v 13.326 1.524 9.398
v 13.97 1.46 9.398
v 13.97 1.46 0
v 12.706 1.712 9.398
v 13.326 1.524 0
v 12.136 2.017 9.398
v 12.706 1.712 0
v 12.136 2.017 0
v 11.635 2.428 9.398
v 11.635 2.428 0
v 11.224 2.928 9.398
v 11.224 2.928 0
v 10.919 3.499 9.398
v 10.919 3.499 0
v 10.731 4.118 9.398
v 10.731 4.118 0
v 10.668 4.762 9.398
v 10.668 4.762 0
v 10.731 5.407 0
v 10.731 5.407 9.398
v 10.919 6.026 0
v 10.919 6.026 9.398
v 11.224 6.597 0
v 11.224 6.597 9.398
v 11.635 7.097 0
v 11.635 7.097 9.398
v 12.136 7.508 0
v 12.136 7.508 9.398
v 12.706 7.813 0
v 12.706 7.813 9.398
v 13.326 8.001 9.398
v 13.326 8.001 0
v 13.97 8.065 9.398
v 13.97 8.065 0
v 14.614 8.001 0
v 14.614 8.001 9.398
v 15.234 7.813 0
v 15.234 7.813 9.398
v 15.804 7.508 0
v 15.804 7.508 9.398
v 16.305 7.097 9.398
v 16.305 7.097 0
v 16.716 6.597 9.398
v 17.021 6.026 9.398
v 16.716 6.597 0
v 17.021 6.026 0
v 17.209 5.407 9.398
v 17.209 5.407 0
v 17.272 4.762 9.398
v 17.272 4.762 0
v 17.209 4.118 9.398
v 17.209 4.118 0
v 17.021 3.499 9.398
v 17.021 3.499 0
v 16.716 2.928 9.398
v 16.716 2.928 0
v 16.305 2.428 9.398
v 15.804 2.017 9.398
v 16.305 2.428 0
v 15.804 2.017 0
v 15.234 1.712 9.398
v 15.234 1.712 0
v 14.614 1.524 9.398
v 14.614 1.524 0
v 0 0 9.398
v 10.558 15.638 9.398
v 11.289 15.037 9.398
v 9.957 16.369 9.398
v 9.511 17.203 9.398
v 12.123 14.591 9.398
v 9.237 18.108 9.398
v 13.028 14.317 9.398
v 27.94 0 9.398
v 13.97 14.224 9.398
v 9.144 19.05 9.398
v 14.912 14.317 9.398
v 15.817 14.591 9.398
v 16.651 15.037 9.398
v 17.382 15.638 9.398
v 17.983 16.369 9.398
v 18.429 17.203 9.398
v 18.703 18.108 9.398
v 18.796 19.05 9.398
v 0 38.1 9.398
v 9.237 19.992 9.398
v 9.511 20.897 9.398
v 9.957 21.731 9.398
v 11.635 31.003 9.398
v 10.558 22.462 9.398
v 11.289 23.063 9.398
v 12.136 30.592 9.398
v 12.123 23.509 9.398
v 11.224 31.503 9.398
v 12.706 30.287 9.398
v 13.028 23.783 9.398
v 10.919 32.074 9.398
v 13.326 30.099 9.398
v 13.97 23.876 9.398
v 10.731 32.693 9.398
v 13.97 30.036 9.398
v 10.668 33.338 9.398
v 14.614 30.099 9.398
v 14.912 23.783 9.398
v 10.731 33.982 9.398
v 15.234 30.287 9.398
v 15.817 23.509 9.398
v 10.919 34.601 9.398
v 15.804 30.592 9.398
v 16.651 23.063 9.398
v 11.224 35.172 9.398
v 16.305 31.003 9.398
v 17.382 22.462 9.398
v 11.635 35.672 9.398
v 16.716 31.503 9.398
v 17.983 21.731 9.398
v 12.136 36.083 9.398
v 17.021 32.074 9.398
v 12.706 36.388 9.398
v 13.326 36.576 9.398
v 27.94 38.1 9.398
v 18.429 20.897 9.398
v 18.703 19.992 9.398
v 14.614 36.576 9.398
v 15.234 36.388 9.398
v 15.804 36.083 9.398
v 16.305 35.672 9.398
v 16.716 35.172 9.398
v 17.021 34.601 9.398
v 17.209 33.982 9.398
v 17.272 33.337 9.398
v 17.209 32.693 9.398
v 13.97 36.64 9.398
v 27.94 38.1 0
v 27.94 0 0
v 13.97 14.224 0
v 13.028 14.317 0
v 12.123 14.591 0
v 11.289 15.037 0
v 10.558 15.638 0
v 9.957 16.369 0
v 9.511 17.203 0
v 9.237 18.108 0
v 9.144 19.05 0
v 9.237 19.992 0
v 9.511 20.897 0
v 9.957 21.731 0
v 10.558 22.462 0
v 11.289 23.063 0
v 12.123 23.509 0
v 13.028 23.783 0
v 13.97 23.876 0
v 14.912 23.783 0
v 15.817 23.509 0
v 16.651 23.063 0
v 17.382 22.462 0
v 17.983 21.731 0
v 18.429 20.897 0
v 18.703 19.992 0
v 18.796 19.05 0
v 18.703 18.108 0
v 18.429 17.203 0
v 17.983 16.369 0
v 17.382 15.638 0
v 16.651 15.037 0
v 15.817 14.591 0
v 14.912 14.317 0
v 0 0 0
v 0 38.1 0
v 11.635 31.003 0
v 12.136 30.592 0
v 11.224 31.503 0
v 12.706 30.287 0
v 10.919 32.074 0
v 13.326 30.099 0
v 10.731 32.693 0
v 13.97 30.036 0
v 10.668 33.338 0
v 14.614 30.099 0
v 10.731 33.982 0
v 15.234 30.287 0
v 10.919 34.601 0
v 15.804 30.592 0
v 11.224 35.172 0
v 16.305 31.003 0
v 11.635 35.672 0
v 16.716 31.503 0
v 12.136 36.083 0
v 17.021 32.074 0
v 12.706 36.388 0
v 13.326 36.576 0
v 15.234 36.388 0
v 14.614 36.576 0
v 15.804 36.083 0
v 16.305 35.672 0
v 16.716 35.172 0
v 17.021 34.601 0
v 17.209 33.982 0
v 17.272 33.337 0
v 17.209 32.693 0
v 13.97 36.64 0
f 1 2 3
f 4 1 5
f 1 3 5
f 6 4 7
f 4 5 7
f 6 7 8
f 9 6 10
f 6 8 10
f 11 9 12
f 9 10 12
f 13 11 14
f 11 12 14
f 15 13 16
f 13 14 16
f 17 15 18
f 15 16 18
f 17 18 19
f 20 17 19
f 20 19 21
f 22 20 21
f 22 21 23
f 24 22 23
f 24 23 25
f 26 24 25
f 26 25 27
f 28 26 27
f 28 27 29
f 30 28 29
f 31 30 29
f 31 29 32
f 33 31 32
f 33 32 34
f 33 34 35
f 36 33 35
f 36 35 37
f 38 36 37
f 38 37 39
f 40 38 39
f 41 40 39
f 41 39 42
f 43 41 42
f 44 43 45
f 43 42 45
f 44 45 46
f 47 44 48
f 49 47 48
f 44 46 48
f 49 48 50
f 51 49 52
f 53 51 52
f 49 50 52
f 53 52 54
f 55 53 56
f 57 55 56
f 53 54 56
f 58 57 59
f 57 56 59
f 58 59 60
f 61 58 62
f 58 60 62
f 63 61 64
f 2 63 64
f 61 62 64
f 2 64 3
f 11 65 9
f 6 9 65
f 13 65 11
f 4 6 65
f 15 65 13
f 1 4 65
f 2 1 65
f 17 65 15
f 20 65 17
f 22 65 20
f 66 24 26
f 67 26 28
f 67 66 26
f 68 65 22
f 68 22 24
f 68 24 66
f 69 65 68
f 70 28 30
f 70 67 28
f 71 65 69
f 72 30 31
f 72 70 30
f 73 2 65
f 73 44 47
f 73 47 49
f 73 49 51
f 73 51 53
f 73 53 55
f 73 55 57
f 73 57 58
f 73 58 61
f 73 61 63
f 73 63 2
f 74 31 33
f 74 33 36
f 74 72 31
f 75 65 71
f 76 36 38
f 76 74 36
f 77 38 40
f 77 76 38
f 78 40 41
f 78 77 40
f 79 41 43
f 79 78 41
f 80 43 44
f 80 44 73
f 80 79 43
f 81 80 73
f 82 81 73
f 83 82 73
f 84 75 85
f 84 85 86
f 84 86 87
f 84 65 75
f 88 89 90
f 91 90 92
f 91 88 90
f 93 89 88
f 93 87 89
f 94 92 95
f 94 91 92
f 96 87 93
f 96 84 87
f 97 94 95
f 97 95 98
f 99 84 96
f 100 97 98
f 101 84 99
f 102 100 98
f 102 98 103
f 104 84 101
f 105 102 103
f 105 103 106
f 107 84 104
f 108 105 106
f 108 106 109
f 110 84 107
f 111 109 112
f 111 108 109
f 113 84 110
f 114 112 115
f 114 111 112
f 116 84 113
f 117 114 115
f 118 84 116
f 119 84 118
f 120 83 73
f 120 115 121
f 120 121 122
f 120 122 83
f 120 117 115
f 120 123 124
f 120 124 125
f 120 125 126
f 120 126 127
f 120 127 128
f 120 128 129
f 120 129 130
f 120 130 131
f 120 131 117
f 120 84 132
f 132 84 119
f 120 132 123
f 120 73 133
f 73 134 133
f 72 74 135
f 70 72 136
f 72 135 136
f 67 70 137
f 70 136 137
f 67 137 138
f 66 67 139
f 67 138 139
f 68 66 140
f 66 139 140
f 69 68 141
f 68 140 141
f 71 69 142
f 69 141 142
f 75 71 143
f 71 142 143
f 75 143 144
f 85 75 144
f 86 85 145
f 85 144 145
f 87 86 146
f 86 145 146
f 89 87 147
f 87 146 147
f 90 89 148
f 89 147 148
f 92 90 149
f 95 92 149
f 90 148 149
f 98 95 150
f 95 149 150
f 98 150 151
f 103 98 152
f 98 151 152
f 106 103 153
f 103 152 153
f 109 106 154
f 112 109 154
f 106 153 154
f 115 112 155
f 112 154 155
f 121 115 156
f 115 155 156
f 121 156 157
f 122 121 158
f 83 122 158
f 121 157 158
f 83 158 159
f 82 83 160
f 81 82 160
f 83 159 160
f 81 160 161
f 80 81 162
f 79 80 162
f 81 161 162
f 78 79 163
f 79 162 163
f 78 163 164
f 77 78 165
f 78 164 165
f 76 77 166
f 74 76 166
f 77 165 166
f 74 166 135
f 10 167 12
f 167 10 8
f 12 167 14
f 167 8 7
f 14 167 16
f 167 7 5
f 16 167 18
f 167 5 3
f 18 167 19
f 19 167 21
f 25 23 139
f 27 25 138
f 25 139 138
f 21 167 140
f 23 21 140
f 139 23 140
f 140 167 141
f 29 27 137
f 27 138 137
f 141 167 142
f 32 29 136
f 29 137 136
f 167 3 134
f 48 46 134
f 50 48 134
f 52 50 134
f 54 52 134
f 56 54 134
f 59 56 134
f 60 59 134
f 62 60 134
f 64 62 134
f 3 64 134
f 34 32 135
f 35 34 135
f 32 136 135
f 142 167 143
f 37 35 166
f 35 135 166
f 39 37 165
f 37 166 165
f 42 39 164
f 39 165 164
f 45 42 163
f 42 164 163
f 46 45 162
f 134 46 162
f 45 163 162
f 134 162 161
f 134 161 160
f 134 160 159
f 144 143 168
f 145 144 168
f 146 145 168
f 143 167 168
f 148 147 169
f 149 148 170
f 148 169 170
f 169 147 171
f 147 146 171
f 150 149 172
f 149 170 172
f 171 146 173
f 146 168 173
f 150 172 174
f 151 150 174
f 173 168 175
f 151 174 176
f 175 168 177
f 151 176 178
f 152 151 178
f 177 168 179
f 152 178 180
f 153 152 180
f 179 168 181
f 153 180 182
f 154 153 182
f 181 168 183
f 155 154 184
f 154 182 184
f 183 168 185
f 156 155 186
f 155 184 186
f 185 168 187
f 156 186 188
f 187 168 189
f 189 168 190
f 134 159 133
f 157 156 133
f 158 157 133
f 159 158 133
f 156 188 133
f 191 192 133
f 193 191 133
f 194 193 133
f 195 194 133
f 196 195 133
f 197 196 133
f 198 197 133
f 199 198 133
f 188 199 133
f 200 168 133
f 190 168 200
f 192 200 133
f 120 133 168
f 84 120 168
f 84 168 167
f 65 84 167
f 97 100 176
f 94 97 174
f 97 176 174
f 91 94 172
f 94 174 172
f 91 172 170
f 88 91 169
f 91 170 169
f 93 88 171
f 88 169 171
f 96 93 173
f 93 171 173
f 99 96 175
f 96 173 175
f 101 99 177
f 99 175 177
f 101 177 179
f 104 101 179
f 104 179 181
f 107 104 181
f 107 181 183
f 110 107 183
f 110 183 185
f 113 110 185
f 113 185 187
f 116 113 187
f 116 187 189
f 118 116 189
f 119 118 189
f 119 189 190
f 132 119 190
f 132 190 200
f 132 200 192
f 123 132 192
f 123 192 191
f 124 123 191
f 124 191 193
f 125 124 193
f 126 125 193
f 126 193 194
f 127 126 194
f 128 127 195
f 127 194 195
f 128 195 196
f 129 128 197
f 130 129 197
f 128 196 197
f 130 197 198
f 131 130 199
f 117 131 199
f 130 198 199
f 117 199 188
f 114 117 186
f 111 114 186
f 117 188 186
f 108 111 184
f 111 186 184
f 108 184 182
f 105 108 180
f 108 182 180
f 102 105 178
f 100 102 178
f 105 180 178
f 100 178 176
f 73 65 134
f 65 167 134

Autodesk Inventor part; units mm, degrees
ref_plane "YZ Plane" through (0, 0, 0) normal (1, 0, 0) x (0, 1, 0)
ref_plane "XZ Plane" through (0, 0, 0) normal (0, 1, 0) x (-1, 0, 0)
ref_plane "XY Plane" through (0, 0, 0) normal (0, 0, 1) x (1, 0, 0)
sketch "Sketch1" plane through (0, 0, 0) normal (0, 0, 1) x (1, 0, 0)
  line L0 (0, 0) -> (27.94, 0)
  line L1 (27.94, 0) -> (27.94, 38.1)
  line L2 (27.94, 38.1) -> (0, 38.1)
  line L3 (0, 38.1) -> (0, 0)
  dimension "d0" = 27.94
  dimension "d1" = 38.1
extrude "Extrusion1" add sketch "Sketch1" along normal blind 9.398
sketch "Sketch2" plane through (0, 0, 9.398) normal (0, 0, 1) x (1, 0, 0)
  line L0 (0, 0) -> (27.94, 0) projected
  line L1 (27.94, 0) -> (27.94, 38.1) projected
  line L2 (27.94, 38.1) -> (0, 38.1) projected
  line L3 (0, 38.1) -> (0, 0) projected
  point P0 (13.97, 33.3375)
  point P1 (13.97, 4.7625)
  dimension "d4" = 28.575
  dimension "d5" = 38.1
  dimension "d6" = 4.7625
  dimension "d7" = 27.94
  dimension "d8" = 13.97
  dimension "d9" = 13.97
hole "Hole1" at (13.97, 33.3375, 9.398) at (13.97, 4.7625, 9.398) direction (0, 0, -1) diameter 6.604 depth 10.9728 tip angle 118
sketch "Sketch3" plane through (0, 0, 9.398) normal (0, 0, 1) x (1, 0, 0)
  circle A0 centre (13.97, 33.3375) radius 3.302 projected
  circle A1 centre (13.97, 4.7625) radius 3.302 projected
  line L0 (0, 0) -> (27.94, 0) projected
  line L1 (27.94, 0) -> (27.94, 38.1) projected
  line L2 (27.94, 38.1) -> (0, 38.1) projected
  line L3 (0, 38.1) -> (0, 0) projected
  point P0 (13.97, 19.05)
  dimension "d17" = 27.94
  dimension "d18" = 38.1
  dimension "d19" = 13.97
  dimension "d20" = 19.05
hole "Hole2" at (13.97, 19.05, 9.398) direction (0, 0, -1) diameter 9.652 depth 10.9728 tip angle 118
equation "\"d6\" = -0.5 * d4 + 0.5 * d5"
equation "\"d8\" = 0.5 * d7"
equation "\"d9\" = d8"
equation "\"d19\" = 0.5 * d17"
equation "\"d20\" = 0.5 * d18"
properties part number "lift top"
